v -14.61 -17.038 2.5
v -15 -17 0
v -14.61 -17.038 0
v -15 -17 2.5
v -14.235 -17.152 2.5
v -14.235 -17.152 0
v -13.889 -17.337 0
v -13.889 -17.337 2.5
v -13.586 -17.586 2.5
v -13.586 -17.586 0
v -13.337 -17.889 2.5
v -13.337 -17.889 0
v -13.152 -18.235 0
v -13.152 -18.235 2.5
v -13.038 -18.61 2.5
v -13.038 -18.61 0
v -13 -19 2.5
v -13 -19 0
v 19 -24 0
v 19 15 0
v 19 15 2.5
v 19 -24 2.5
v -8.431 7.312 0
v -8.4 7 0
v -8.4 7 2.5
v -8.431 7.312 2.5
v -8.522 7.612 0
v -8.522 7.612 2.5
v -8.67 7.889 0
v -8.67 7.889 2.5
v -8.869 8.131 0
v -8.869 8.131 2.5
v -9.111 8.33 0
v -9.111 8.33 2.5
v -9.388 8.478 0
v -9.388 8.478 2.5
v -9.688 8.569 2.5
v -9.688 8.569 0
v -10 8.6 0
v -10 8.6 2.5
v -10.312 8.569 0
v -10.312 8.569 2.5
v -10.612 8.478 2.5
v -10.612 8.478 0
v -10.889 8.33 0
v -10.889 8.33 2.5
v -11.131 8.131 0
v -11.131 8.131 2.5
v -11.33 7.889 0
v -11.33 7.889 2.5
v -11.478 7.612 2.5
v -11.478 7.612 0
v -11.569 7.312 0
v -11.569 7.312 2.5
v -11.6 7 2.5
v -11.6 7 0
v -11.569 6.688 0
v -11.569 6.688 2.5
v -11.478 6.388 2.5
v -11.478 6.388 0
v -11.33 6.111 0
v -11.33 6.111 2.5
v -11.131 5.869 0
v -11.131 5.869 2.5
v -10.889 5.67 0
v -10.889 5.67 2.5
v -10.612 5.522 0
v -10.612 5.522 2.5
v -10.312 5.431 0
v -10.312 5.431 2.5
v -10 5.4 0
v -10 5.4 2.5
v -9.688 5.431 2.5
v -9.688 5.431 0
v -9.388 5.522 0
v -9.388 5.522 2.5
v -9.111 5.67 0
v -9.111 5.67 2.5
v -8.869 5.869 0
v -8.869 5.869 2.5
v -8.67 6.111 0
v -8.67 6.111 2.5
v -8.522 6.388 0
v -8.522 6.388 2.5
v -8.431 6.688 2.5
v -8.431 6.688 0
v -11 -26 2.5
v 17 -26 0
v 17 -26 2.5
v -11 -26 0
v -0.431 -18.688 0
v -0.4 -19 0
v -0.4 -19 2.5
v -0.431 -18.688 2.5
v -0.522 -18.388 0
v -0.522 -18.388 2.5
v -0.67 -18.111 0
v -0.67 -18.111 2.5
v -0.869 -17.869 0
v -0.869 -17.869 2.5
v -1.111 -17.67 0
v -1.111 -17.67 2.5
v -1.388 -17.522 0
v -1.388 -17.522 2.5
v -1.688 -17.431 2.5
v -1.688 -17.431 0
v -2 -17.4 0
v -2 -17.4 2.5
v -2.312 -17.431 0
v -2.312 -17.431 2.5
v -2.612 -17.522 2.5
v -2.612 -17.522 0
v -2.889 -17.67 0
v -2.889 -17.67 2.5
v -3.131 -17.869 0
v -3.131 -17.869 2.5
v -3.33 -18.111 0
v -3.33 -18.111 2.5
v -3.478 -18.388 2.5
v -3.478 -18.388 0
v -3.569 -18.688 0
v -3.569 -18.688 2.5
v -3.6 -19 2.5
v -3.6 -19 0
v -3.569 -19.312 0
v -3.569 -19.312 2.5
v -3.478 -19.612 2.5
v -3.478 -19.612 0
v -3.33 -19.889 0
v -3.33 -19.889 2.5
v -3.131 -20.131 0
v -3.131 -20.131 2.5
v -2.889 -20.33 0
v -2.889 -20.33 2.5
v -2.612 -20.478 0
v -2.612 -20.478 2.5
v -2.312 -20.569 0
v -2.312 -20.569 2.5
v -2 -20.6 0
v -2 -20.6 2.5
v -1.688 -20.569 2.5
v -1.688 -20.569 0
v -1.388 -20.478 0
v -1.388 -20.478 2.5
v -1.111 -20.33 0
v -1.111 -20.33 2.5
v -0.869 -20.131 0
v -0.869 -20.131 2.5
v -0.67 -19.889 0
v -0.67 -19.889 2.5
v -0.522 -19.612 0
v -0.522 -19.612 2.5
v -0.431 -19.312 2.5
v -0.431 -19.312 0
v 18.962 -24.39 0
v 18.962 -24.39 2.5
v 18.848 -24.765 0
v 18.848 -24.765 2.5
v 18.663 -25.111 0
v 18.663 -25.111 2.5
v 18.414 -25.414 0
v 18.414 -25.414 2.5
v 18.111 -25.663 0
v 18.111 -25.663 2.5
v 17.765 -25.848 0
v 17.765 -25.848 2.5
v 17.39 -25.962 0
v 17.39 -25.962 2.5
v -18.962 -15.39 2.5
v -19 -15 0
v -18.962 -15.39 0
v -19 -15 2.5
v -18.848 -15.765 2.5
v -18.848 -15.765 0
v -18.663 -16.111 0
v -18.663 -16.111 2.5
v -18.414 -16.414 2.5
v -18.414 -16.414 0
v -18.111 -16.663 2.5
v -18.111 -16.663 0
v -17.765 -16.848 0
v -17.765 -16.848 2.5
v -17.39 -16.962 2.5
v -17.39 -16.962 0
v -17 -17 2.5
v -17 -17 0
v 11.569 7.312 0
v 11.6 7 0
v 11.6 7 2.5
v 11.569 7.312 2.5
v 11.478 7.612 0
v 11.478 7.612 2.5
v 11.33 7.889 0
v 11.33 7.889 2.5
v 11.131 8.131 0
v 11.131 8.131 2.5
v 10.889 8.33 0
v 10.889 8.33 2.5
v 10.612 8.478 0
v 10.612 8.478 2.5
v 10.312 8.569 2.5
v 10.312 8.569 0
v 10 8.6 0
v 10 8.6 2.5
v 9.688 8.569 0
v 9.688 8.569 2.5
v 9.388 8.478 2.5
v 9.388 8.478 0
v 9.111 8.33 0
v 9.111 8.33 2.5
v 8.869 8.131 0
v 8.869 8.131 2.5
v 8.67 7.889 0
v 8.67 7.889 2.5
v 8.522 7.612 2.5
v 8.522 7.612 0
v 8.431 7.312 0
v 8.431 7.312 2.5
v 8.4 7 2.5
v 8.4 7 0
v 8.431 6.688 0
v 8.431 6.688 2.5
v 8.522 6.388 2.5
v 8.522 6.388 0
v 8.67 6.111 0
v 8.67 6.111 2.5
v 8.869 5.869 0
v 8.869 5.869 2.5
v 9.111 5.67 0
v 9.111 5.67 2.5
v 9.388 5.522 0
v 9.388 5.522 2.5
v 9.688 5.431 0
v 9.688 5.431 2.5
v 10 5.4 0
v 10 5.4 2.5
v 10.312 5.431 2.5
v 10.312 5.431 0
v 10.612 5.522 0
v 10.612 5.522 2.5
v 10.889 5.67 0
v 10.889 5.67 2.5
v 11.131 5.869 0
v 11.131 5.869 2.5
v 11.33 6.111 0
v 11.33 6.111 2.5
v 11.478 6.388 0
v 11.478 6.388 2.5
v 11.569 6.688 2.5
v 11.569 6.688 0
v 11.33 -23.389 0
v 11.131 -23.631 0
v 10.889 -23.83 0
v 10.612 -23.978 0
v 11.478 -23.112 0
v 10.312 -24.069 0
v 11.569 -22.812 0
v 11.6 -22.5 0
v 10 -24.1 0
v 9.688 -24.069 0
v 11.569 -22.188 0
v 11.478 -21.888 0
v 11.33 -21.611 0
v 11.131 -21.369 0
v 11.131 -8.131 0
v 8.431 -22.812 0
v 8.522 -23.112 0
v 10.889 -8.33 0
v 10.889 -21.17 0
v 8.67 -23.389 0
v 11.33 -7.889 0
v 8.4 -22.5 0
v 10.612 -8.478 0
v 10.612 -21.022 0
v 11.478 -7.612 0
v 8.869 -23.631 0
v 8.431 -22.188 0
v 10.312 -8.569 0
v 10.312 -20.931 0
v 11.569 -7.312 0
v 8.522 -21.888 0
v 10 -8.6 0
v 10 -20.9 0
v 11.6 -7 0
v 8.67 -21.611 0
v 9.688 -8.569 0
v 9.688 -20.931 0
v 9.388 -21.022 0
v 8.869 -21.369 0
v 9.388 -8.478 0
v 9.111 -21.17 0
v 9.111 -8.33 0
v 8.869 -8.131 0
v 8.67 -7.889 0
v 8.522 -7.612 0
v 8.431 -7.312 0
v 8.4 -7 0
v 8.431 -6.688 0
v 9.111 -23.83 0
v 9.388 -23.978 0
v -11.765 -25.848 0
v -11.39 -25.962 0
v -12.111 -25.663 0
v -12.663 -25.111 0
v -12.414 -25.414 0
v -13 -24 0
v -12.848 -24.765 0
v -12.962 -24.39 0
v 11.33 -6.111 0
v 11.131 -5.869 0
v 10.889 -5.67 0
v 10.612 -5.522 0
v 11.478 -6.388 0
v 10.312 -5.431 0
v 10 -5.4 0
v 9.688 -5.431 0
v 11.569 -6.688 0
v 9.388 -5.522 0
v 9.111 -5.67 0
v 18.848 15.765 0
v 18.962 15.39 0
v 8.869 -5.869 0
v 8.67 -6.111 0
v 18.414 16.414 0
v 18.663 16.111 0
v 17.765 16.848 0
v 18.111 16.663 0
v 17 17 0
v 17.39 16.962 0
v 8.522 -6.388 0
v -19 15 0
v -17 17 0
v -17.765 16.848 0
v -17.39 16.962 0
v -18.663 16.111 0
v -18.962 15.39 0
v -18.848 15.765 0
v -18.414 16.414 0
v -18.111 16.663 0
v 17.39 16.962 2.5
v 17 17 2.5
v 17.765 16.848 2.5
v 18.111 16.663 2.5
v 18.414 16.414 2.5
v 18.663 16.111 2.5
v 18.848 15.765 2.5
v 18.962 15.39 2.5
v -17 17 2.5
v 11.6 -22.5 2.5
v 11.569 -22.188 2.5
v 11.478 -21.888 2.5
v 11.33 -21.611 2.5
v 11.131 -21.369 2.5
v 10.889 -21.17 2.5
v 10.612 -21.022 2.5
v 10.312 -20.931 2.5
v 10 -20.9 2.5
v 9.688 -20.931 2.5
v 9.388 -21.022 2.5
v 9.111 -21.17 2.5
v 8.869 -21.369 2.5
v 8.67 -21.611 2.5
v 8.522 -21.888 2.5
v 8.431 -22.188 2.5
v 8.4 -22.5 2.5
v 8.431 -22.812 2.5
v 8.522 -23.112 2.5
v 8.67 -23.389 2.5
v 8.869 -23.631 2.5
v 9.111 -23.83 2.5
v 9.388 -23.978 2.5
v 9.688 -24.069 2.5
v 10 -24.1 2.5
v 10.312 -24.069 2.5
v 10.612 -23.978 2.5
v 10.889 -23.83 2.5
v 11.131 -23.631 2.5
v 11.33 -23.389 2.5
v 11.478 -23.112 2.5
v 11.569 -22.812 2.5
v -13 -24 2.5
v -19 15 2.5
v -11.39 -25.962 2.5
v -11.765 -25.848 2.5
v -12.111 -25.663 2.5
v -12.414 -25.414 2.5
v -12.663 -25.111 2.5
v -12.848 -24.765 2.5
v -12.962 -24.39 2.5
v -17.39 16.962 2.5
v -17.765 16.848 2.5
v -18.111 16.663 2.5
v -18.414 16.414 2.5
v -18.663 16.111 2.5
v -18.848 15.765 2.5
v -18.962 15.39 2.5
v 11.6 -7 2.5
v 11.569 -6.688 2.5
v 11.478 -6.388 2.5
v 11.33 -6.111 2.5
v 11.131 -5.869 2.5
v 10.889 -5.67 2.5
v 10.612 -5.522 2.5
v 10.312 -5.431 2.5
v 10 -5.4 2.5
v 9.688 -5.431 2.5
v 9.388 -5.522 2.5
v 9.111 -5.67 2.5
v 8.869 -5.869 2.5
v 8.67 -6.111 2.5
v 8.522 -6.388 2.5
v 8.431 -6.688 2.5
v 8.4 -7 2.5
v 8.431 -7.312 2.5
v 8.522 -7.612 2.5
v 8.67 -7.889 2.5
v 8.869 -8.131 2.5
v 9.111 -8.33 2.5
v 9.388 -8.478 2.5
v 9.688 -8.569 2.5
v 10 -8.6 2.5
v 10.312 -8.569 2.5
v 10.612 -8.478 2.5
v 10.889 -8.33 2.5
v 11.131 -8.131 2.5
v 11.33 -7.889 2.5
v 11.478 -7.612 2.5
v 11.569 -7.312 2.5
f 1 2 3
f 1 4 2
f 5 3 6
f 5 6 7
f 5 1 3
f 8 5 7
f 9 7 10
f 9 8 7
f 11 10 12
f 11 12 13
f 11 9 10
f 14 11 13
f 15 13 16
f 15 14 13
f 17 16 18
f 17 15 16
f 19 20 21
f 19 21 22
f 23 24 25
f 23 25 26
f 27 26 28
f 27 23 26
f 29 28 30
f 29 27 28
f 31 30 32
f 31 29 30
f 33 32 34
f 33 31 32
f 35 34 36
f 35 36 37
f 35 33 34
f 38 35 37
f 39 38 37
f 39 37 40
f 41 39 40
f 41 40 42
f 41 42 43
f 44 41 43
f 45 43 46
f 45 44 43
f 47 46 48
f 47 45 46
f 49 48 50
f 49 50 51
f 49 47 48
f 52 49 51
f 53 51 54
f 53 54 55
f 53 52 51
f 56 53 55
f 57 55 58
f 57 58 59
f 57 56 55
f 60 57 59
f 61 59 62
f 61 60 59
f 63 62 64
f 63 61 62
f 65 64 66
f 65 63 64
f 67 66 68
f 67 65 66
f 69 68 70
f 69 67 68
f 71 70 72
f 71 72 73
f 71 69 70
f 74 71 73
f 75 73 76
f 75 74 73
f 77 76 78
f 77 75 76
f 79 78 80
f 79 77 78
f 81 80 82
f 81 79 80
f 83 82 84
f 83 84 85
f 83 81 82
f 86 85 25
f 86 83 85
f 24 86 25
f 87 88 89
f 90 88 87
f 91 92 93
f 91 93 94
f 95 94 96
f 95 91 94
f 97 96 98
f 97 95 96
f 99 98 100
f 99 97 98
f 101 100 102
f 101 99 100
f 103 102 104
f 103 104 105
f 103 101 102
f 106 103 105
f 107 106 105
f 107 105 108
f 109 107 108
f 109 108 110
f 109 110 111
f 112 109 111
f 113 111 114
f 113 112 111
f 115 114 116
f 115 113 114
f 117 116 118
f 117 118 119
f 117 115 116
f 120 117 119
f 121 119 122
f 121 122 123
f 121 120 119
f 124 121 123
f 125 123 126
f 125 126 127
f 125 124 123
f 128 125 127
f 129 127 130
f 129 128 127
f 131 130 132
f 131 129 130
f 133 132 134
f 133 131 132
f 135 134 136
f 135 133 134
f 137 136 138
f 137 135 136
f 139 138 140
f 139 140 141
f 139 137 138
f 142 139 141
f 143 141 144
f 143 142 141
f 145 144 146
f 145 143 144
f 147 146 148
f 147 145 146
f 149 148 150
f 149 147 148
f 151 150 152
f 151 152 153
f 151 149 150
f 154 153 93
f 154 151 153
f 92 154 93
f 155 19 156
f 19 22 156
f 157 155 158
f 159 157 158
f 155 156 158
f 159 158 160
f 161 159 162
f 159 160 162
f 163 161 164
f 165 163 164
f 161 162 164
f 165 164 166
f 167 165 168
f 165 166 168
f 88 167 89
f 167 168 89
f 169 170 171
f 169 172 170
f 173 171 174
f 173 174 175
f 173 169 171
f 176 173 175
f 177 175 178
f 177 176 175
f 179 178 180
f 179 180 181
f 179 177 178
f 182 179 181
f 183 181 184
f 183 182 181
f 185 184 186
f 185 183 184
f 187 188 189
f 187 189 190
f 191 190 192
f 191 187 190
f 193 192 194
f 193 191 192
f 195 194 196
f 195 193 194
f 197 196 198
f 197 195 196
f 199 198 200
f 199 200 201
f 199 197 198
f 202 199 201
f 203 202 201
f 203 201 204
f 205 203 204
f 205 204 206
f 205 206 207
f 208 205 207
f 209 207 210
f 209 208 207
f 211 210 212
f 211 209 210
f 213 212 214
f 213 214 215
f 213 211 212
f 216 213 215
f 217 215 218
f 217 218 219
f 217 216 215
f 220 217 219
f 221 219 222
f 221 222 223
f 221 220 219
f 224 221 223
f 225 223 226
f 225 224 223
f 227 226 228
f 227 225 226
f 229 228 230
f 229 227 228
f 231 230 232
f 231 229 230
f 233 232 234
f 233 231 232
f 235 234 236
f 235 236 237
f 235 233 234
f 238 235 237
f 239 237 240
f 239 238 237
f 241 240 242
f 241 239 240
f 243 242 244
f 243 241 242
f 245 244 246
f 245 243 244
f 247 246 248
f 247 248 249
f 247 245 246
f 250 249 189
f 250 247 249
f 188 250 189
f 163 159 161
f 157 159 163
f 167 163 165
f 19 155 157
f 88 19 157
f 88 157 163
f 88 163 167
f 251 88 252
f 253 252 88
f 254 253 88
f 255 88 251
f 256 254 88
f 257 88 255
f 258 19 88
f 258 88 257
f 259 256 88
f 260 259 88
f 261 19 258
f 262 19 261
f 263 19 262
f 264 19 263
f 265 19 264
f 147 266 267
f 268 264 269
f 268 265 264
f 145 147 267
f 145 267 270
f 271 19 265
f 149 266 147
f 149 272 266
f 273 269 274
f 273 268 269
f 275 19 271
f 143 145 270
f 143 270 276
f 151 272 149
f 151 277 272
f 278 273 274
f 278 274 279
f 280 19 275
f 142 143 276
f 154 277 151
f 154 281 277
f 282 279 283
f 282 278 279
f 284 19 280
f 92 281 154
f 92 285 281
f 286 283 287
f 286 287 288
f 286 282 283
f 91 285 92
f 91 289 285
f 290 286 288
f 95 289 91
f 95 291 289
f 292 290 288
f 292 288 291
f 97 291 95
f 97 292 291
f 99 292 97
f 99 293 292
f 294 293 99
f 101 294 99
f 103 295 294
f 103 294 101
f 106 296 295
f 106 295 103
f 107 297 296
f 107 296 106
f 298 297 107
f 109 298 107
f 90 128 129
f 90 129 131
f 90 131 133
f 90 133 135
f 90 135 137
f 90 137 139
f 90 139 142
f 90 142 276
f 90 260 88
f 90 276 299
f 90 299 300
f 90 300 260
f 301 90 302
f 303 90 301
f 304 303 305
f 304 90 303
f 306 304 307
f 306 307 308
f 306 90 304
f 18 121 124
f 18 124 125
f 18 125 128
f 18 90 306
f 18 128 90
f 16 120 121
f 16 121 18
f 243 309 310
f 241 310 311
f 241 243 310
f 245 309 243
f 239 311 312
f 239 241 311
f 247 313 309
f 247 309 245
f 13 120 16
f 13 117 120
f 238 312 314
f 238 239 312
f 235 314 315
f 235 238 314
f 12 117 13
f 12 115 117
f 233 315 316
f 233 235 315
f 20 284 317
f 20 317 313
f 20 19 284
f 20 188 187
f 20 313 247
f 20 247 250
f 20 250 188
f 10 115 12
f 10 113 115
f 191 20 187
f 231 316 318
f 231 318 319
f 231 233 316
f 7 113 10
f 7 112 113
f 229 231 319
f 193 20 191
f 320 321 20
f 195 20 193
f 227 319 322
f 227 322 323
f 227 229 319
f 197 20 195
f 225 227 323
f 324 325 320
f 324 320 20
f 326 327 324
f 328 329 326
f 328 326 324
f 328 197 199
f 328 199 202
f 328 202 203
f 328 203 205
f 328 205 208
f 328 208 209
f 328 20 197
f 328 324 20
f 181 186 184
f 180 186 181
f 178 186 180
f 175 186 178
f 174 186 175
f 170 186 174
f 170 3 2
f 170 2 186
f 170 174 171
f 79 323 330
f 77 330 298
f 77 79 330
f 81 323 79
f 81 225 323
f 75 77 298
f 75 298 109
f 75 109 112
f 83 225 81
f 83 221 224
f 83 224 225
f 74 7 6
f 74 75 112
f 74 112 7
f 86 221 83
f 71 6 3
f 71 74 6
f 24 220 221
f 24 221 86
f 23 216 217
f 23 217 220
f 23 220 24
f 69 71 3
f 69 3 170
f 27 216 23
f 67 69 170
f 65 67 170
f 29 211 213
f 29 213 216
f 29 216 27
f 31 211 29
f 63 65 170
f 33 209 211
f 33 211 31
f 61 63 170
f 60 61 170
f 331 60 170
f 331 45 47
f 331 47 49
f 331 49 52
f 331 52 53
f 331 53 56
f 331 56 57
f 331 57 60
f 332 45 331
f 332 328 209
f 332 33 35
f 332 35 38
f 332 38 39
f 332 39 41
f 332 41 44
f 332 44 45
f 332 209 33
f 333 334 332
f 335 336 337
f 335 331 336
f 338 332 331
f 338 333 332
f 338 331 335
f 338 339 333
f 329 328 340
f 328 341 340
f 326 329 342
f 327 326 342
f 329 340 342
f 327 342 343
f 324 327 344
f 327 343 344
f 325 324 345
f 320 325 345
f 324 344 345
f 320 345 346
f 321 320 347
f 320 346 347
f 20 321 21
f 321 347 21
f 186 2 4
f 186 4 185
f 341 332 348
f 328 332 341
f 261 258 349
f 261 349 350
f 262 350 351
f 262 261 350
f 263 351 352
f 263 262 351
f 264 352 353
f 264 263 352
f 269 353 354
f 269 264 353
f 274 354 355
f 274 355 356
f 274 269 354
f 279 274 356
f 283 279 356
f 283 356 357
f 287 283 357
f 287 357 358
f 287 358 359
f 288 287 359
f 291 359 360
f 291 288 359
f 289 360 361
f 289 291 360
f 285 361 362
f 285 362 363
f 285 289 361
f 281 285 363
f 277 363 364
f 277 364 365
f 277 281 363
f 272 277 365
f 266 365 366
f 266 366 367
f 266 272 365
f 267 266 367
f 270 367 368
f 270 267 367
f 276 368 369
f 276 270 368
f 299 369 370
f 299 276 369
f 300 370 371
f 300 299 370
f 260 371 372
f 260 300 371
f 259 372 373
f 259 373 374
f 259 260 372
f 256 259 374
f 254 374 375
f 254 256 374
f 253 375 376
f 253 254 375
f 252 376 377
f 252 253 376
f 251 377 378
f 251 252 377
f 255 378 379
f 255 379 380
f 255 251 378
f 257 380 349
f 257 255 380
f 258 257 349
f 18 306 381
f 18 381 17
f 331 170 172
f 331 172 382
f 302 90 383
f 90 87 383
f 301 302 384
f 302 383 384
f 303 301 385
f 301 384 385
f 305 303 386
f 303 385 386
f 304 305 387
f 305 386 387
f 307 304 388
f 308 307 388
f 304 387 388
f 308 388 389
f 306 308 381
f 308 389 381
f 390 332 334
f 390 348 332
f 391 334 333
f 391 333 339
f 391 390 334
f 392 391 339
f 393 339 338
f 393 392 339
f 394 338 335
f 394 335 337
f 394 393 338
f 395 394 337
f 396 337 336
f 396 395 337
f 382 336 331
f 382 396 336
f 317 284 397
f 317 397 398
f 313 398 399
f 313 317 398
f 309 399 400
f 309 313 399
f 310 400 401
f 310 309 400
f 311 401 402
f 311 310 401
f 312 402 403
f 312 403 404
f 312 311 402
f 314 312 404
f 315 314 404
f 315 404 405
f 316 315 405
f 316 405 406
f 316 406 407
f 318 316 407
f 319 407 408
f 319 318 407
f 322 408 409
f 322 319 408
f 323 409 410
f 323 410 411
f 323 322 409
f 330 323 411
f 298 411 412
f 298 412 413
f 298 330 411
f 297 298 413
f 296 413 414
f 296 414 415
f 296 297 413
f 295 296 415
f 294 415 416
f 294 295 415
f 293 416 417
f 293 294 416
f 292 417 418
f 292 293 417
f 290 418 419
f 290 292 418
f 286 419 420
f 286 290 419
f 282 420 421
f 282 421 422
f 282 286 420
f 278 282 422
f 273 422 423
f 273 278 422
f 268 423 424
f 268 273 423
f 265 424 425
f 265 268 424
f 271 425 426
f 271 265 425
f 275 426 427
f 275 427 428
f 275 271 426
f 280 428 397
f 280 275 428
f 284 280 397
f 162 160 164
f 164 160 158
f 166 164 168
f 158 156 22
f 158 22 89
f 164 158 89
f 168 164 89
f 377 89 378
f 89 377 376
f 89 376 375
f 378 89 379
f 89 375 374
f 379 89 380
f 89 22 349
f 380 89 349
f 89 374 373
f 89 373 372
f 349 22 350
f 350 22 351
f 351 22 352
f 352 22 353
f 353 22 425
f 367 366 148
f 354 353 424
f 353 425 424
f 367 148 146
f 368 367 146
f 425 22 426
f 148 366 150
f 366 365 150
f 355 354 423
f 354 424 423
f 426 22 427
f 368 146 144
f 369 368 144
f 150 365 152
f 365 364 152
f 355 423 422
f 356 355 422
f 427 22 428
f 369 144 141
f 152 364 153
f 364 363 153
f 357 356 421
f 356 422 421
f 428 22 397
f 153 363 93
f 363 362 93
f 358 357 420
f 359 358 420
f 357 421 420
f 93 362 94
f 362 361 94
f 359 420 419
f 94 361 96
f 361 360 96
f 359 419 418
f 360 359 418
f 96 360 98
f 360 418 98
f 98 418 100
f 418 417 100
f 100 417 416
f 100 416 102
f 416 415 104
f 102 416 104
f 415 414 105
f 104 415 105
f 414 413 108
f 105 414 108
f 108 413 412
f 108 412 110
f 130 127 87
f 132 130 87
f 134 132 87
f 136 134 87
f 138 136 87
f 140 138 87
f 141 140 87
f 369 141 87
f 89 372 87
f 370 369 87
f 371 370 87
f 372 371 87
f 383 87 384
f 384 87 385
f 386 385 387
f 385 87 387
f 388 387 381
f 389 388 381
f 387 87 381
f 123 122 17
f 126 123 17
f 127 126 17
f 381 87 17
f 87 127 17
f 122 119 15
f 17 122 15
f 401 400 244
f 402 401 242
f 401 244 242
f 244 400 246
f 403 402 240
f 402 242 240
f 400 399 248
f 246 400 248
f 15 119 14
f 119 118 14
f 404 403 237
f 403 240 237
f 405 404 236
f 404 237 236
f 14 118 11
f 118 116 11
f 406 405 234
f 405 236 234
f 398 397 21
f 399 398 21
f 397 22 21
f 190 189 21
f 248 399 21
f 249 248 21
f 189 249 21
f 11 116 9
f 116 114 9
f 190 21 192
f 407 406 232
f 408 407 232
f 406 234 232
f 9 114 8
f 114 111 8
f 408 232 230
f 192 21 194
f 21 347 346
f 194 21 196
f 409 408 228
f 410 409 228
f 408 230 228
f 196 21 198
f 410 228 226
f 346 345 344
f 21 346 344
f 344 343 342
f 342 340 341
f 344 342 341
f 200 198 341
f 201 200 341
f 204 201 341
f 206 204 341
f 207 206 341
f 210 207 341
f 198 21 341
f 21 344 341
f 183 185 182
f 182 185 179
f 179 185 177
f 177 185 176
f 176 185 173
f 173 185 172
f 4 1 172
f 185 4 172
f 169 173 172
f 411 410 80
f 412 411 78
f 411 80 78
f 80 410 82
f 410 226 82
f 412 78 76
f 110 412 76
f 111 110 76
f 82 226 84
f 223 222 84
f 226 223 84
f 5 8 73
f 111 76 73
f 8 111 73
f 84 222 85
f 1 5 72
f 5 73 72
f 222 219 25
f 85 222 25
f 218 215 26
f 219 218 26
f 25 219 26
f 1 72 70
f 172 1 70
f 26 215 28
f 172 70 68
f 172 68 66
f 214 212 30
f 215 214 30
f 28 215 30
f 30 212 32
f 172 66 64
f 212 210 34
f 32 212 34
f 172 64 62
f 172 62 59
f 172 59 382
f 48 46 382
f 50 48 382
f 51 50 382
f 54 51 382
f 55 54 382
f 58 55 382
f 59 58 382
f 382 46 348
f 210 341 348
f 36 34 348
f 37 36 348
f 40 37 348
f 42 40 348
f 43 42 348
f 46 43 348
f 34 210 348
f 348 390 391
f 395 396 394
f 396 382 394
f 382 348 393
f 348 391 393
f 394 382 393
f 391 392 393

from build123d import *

# Parameters (mm, degrees)
SKETCH_1_R      = 1.6
EXTRUDE_1_DEPTH = 2.5
FILLET_2_R      = 2


with BuildPart() as part:
    # 草图1 → 凸台-拉伸1 (new body)
    with BuildSketch(Plane.XY):
        Polygon((-19, 17), (19, 17), (19, -26), (-13, -26), (-13, -17), (-19, -17), align=None)
        with Locations((10, 7)):
            Circle(SKETCH_1_R, mode=Mode.SUBTRACT)
        with Locations((-10, 7)):
            Circle(SKETCH_1_R, mode=Mode.SUBTRACT)
        with Locations((10, -22.5)):
            Circle(SKETCH_1_R, mode=Mode.SUBTRACT)
        with Locations((10, -7)):
            Circle(SKETCH_1_R, mode=Mode.SUBTRACT)
        with Locations((-2, -19)):
            Circle(SKETCH_1_R, mode=Mode.SUBTRACT)
    extrude(amount=EXTRUDE_1_DEPTH)

    # 圆角2
    fillet_2_edges = [part.edges().sort_by_distance(p)[0] for p in [
        (-19, 17, 1.25),
        (19, 17, 1.25),
        (19, -26, 1.25),
        (-13, -26, 1.25),
        (-13, -17, 1.25),
        (-19, -17, 1.25),
    ]]
    fillet(fillet_2_edges, radius=FILLET_2_R)


solid = part.part
